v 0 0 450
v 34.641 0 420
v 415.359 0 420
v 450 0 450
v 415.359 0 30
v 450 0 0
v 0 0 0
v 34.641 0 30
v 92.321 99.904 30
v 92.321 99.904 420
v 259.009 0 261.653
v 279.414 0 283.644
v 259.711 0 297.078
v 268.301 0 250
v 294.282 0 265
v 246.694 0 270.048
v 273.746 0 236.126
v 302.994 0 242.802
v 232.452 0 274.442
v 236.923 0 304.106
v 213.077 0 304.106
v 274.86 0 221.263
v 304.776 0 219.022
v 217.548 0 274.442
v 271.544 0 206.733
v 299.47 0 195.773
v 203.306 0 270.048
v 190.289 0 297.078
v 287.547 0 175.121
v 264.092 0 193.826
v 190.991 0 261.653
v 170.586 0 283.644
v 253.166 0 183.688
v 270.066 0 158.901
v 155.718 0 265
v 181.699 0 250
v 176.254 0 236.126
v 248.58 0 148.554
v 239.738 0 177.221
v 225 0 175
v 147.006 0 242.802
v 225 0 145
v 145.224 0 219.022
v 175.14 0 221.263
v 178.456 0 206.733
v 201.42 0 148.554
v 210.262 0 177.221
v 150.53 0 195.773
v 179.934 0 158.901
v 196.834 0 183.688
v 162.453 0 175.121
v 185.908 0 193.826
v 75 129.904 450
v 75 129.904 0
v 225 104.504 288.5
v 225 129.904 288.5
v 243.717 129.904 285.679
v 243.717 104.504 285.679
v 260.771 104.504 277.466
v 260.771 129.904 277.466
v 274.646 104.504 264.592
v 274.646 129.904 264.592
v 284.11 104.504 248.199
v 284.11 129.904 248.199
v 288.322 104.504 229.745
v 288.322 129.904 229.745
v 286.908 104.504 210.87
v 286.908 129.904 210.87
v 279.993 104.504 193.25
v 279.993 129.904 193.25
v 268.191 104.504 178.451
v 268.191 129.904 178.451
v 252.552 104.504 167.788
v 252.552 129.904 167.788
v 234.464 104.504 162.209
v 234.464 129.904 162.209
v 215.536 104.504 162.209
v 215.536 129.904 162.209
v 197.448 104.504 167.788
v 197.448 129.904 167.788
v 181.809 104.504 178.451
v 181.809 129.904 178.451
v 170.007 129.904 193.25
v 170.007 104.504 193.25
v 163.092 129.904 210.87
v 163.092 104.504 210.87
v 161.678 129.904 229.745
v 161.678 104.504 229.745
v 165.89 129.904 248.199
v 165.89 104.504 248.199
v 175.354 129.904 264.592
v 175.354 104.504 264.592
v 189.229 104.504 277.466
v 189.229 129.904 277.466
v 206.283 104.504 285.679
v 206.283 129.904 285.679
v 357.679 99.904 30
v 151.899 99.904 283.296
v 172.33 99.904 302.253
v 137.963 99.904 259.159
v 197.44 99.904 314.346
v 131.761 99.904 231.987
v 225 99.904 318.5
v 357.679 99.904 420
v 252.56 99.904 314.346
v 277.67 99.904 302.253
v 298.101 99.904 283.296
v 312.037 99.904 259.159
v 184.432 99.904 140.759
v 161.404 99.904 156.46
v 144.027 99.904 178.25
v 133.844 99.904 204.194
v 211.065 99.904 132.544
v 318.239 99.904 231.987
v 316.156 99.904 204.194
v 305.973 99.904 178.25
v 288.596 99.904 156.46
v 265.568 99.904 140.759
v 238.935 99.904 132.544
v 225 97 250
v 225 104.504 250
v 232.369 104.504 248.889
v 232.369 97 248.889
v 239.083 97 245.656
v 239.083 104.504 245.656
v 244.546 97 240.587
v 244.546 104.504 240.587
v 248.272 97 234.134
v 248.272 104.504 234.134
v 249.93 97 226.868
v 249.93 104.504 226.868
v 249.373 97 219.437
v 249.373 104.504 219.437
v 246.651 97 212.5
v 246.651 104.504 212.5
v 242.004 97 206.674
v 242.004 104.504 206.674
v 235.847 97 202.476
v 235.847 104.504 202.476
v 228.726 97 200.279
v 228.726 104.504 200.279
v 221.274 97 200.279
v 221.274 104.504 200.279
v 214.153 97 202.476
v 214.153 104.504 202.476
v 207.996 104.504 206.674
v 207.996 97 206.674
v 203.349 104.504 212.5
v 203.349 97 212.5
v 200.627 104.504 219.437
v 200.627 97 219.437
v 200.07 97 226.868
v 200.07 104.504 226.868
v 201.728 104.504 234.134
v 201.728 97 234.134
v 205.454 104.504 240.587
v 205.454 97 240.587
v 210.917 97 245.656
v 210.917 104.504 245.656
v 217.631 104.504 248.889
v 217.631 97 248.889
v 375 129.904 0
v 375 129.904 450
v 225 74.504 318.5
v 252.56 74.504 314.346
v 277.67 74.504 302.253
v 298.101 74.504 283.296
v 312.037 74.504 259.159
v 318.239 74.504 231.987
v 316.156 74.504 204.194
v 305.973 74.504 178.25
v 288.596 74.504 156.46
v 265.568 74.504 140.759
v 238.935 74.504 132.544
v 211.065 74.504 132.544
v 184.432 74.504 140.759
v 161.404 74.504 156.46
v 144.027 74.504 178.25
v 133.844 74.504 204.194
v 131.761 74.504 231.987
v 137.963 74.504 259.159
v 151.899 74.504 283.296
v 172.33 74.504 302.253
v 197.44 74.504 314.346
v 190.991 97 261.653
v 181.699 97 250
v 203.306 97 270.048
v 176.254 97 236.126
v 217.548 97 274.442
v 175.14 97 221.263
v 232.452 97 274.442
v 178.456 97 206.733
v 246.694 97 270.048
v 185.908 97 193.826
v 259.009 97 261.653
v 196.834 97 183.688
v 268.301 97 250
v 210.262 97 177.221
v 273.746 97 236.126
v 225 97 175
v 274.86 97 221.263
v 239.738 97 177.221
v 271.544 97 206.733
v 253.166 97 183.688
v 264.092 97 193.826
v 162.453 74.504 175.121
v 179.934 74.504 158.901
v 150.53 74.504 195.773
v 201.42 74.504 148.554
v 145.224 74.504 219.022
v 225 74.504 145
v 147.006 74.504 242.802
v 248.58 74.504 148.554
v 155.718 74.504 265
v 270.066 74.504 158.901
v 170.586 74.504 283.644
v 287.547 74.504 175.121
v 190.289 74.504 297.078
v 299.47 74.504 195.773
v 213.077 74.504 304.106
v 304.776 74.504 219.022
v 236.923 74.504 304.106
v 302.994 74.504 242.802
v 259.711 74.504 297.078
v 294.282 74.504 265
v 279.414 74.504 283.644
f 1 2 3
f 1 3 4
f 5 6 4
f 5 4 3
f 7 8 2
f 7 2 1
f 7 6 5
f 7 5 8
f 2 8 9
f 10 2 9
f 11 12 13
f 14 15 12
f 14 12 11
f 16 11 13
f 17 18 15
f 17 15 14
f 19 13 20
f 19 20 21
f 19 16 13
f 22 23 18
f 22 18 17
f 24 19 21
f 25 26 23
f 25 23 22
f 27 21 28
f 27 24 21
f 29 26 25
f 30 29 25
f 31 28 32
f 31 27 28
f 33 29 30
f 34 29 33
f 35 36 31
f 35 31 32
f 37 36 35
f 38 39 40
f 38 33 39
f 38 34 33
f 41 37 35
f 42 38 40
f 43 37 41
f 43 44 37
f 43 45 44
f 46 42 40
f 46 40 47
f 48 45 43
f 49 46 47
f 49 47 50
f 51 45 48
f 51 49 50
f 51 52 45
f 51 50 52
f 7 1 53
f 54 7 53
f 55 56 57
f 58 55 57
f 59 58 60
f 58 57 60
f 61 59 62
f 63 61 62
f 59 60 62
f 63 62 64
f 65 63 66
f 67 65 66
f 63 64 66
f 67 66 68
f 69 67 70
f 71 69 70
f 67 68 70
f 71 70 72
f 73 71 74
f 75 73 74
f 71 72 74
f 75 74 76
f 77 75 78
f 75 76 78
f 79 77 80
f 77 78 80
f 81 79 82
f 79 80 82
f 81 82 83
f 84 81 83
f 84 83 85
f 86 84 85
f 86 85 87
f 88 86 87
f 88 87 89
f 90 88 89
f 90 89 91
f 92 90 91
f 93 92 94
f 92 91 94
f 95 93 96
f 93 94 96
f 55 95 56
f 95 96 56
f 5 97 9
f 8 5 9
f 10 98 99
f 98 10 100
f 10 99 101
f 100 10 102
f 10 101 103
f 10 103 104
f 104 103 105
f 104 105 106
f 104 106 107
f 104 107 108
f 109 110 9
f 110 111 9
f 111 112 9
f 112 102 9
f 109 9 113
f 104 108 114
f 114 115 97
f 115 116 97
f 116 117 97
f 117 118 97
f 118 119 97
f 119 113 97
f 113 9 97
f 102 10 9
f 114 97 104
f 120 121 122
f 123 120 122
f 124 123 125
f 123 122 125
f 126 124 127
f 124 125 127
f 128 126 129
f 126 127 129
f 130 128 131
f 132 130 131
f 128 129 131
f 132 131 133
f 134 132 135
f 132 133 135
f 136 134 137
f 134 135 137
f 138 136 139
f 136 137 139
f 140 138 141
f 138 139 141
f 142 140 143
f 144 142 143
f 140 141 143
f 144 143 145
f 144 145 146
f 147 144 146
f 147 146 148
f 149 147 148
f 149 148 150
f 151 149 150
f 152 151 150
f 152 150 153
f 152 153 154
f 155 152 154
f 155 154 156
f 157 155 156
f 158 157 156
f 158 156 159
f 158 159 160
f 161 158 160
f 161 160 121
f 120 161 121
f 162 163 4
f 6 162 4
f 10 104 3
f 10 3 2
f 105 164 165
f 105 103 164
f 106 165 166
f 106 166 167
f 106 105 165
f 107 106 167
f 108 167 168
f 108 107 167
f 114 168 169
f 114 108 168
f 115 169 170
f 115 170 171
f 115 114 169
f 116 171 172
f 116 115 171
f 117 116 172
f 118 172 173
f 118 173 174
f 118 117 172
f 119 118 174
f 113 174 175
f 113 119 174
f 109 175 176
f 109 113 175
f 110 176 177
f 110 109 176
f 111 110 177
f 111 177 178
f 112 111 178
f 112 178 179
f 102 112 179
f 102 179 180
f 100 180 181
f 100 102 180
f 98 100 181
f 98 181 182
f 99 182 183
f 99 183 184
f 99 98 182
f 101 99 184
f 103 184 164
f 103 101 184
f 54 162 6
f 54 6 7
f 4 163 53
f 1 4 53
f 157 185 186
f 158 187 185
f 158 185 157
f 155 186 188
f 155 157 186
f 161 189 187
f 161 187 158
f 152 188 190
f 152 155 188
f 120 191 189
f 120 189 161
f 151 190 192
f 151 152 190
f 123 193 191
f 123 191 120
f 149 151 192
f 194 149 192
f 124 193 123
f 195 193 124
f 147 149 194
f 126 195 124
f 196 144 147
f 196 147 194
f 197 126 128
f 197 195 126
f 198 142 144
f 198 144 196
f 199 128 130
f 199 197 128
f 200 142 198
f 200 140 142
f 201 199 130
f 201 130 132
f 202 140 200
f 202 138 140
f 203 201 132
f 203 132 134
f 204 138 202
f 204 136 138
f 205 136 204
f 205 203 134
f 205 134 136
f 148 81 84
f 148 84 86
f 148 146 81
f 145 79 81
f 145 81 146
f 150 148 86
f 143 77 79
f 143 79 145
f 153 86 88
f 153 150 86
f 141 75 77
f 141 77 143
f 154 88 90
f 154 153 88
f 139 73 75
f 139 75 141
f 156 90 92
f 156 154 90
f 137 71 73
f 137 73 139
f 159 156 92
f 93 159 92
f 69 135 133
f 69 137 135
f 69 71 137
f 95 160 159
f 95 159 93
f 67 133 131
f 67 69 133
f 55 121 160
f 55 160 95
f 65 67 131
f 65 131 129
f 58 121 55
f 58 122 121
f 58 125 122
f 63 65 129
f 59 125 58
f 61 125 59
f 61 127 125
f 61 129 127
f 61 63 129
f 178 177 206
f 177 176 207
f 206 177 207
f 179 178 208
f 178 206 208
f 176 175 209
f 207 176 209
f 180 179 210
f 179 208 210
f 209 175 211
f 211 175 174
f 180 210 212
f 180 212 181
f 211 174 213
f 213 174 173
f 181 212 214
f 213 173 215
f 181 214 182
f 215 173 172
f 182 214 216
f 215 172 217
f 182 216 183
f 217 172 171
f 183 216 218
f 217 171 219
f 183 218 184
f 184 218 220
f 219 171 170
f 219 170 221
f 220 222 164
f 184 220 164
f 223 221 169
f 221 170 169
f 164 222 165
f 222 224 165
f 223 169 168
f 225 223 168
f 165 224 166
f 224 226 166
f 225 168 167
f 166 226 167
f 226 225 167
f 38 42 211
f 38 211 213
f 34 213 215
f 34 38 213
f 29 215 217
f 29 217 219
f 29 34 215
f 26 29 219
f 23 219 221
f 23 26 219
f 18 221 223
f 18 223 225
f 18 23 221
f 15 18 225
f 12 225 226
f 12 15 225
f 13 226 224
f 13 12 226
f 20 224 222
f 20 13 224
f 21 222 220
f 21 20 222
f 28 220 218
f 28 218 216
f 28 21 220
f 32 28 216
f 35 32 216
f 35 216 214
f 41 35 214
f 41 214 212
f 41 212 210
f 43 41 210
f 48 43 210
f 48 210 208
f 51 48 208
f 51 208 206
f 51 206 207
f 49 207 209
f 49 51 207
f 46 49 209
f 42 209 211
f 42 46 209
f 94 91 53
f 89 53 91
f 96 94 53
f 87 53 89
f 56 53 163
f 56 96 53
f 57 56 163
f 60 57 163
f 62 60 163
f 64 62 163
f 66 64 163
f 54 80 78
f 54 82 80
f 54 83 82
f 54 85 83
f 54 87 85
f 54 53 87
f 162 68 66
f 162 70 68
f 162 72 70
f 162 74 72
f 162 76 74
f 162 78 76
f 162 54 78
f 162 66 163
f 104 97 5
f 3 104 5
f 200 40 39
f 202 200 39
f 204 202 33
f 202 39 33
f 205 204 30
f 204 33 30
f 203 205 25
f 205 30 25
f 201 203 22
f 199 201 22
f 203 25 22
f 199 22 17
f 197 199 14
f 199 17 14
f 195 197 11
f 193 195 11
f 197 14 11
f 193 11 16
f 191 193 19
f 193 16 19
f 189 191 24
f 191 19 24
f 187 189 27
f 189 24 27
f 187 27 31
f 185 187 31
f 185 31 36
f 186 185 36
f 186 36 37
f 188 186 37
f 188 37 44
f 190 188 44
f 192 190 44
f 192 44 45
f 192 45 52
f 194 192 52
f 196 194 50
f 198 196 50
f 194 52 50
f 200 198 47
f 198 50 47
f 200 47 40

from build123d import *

# Parameters (mm, degrees)
BOSS_EXTRU_1_DEPTH      = 450
ESQUISSE3_R             = 63.5
ENL_V_MAT_EXTRU_1_DEPTH = 25.4
ESQUISSE4_R             = 25
ENL_V_MAT_EXTRU_2_DEPTH = 20
ESQUISSE2_R             = 50
ENL_V_MAT_EXTRU_3_DEPTH = 97
COQUE1_T                = -30


with BuildPart() as part:
    # Esquisse1 → Boss.-Extru.1 (new body)
    with BuildSketch(Plane.XY):
        Polygon((75, 129.903810568), (375, 129.903810568), (450, 0), (0, 0), align=None)
    extrude(amount=BOSS_EXTRU_1_DEPTH)

    # Esquisse3 → Enlèv. mat.-Extru.1 (cut)
    with BuildSketch(Plane(origin=(0, 129.903810568, 0), x_dir=(1, 0, 0), z_dir=(0, 1, 0))):
        with Locations(Location((225, -225, 0), (0, 0, 270))):
            Circle(ESQUISSE3_R)
    extrude(amount=-ENL_V_MAT_EXTRU_1_DEPTH, mode=Mode.SUBTRACT)

    # Esquisse4 → Enlèv. mat.-Extru.2 (cut)
    with BuildSketch(Plane(origin=(0, 104.503810568, 0), x_dir=(1, 0, 0), z_dir=(0, 1, 0))):
        with Locations(Location((225, -225, 0), (0, 0, 270))):
            Circle(ESQUISSE4_R)
    extrude(amount=-ENL_V_MAT_EXTRU_2_DEPTH, mode=Mode.SUBTRACT)

    # Esquisse2 → Enlèv. mat.-Extru.3 (cut)
    with BuildSketch(Plane.XZ):
        with Locations(Location((225, 225, 0), (0, 0, 270))):
            Circle(ESQUISSE2_R)
    extrude(amount=-ENL_V_MAT_EXTRU_3_DEPTH, mode=Mode.SUBTRACT)

    # Coque1
    coque1_openings = [part.faces().sort_by_distance(p)[0] for p in [
        (443.636038969, 0, 225),
    ]]
    offset(amount=COQUE1_T, openings=coque1_openings, kind=Kind.INTERSECTION)


solid = part.part
